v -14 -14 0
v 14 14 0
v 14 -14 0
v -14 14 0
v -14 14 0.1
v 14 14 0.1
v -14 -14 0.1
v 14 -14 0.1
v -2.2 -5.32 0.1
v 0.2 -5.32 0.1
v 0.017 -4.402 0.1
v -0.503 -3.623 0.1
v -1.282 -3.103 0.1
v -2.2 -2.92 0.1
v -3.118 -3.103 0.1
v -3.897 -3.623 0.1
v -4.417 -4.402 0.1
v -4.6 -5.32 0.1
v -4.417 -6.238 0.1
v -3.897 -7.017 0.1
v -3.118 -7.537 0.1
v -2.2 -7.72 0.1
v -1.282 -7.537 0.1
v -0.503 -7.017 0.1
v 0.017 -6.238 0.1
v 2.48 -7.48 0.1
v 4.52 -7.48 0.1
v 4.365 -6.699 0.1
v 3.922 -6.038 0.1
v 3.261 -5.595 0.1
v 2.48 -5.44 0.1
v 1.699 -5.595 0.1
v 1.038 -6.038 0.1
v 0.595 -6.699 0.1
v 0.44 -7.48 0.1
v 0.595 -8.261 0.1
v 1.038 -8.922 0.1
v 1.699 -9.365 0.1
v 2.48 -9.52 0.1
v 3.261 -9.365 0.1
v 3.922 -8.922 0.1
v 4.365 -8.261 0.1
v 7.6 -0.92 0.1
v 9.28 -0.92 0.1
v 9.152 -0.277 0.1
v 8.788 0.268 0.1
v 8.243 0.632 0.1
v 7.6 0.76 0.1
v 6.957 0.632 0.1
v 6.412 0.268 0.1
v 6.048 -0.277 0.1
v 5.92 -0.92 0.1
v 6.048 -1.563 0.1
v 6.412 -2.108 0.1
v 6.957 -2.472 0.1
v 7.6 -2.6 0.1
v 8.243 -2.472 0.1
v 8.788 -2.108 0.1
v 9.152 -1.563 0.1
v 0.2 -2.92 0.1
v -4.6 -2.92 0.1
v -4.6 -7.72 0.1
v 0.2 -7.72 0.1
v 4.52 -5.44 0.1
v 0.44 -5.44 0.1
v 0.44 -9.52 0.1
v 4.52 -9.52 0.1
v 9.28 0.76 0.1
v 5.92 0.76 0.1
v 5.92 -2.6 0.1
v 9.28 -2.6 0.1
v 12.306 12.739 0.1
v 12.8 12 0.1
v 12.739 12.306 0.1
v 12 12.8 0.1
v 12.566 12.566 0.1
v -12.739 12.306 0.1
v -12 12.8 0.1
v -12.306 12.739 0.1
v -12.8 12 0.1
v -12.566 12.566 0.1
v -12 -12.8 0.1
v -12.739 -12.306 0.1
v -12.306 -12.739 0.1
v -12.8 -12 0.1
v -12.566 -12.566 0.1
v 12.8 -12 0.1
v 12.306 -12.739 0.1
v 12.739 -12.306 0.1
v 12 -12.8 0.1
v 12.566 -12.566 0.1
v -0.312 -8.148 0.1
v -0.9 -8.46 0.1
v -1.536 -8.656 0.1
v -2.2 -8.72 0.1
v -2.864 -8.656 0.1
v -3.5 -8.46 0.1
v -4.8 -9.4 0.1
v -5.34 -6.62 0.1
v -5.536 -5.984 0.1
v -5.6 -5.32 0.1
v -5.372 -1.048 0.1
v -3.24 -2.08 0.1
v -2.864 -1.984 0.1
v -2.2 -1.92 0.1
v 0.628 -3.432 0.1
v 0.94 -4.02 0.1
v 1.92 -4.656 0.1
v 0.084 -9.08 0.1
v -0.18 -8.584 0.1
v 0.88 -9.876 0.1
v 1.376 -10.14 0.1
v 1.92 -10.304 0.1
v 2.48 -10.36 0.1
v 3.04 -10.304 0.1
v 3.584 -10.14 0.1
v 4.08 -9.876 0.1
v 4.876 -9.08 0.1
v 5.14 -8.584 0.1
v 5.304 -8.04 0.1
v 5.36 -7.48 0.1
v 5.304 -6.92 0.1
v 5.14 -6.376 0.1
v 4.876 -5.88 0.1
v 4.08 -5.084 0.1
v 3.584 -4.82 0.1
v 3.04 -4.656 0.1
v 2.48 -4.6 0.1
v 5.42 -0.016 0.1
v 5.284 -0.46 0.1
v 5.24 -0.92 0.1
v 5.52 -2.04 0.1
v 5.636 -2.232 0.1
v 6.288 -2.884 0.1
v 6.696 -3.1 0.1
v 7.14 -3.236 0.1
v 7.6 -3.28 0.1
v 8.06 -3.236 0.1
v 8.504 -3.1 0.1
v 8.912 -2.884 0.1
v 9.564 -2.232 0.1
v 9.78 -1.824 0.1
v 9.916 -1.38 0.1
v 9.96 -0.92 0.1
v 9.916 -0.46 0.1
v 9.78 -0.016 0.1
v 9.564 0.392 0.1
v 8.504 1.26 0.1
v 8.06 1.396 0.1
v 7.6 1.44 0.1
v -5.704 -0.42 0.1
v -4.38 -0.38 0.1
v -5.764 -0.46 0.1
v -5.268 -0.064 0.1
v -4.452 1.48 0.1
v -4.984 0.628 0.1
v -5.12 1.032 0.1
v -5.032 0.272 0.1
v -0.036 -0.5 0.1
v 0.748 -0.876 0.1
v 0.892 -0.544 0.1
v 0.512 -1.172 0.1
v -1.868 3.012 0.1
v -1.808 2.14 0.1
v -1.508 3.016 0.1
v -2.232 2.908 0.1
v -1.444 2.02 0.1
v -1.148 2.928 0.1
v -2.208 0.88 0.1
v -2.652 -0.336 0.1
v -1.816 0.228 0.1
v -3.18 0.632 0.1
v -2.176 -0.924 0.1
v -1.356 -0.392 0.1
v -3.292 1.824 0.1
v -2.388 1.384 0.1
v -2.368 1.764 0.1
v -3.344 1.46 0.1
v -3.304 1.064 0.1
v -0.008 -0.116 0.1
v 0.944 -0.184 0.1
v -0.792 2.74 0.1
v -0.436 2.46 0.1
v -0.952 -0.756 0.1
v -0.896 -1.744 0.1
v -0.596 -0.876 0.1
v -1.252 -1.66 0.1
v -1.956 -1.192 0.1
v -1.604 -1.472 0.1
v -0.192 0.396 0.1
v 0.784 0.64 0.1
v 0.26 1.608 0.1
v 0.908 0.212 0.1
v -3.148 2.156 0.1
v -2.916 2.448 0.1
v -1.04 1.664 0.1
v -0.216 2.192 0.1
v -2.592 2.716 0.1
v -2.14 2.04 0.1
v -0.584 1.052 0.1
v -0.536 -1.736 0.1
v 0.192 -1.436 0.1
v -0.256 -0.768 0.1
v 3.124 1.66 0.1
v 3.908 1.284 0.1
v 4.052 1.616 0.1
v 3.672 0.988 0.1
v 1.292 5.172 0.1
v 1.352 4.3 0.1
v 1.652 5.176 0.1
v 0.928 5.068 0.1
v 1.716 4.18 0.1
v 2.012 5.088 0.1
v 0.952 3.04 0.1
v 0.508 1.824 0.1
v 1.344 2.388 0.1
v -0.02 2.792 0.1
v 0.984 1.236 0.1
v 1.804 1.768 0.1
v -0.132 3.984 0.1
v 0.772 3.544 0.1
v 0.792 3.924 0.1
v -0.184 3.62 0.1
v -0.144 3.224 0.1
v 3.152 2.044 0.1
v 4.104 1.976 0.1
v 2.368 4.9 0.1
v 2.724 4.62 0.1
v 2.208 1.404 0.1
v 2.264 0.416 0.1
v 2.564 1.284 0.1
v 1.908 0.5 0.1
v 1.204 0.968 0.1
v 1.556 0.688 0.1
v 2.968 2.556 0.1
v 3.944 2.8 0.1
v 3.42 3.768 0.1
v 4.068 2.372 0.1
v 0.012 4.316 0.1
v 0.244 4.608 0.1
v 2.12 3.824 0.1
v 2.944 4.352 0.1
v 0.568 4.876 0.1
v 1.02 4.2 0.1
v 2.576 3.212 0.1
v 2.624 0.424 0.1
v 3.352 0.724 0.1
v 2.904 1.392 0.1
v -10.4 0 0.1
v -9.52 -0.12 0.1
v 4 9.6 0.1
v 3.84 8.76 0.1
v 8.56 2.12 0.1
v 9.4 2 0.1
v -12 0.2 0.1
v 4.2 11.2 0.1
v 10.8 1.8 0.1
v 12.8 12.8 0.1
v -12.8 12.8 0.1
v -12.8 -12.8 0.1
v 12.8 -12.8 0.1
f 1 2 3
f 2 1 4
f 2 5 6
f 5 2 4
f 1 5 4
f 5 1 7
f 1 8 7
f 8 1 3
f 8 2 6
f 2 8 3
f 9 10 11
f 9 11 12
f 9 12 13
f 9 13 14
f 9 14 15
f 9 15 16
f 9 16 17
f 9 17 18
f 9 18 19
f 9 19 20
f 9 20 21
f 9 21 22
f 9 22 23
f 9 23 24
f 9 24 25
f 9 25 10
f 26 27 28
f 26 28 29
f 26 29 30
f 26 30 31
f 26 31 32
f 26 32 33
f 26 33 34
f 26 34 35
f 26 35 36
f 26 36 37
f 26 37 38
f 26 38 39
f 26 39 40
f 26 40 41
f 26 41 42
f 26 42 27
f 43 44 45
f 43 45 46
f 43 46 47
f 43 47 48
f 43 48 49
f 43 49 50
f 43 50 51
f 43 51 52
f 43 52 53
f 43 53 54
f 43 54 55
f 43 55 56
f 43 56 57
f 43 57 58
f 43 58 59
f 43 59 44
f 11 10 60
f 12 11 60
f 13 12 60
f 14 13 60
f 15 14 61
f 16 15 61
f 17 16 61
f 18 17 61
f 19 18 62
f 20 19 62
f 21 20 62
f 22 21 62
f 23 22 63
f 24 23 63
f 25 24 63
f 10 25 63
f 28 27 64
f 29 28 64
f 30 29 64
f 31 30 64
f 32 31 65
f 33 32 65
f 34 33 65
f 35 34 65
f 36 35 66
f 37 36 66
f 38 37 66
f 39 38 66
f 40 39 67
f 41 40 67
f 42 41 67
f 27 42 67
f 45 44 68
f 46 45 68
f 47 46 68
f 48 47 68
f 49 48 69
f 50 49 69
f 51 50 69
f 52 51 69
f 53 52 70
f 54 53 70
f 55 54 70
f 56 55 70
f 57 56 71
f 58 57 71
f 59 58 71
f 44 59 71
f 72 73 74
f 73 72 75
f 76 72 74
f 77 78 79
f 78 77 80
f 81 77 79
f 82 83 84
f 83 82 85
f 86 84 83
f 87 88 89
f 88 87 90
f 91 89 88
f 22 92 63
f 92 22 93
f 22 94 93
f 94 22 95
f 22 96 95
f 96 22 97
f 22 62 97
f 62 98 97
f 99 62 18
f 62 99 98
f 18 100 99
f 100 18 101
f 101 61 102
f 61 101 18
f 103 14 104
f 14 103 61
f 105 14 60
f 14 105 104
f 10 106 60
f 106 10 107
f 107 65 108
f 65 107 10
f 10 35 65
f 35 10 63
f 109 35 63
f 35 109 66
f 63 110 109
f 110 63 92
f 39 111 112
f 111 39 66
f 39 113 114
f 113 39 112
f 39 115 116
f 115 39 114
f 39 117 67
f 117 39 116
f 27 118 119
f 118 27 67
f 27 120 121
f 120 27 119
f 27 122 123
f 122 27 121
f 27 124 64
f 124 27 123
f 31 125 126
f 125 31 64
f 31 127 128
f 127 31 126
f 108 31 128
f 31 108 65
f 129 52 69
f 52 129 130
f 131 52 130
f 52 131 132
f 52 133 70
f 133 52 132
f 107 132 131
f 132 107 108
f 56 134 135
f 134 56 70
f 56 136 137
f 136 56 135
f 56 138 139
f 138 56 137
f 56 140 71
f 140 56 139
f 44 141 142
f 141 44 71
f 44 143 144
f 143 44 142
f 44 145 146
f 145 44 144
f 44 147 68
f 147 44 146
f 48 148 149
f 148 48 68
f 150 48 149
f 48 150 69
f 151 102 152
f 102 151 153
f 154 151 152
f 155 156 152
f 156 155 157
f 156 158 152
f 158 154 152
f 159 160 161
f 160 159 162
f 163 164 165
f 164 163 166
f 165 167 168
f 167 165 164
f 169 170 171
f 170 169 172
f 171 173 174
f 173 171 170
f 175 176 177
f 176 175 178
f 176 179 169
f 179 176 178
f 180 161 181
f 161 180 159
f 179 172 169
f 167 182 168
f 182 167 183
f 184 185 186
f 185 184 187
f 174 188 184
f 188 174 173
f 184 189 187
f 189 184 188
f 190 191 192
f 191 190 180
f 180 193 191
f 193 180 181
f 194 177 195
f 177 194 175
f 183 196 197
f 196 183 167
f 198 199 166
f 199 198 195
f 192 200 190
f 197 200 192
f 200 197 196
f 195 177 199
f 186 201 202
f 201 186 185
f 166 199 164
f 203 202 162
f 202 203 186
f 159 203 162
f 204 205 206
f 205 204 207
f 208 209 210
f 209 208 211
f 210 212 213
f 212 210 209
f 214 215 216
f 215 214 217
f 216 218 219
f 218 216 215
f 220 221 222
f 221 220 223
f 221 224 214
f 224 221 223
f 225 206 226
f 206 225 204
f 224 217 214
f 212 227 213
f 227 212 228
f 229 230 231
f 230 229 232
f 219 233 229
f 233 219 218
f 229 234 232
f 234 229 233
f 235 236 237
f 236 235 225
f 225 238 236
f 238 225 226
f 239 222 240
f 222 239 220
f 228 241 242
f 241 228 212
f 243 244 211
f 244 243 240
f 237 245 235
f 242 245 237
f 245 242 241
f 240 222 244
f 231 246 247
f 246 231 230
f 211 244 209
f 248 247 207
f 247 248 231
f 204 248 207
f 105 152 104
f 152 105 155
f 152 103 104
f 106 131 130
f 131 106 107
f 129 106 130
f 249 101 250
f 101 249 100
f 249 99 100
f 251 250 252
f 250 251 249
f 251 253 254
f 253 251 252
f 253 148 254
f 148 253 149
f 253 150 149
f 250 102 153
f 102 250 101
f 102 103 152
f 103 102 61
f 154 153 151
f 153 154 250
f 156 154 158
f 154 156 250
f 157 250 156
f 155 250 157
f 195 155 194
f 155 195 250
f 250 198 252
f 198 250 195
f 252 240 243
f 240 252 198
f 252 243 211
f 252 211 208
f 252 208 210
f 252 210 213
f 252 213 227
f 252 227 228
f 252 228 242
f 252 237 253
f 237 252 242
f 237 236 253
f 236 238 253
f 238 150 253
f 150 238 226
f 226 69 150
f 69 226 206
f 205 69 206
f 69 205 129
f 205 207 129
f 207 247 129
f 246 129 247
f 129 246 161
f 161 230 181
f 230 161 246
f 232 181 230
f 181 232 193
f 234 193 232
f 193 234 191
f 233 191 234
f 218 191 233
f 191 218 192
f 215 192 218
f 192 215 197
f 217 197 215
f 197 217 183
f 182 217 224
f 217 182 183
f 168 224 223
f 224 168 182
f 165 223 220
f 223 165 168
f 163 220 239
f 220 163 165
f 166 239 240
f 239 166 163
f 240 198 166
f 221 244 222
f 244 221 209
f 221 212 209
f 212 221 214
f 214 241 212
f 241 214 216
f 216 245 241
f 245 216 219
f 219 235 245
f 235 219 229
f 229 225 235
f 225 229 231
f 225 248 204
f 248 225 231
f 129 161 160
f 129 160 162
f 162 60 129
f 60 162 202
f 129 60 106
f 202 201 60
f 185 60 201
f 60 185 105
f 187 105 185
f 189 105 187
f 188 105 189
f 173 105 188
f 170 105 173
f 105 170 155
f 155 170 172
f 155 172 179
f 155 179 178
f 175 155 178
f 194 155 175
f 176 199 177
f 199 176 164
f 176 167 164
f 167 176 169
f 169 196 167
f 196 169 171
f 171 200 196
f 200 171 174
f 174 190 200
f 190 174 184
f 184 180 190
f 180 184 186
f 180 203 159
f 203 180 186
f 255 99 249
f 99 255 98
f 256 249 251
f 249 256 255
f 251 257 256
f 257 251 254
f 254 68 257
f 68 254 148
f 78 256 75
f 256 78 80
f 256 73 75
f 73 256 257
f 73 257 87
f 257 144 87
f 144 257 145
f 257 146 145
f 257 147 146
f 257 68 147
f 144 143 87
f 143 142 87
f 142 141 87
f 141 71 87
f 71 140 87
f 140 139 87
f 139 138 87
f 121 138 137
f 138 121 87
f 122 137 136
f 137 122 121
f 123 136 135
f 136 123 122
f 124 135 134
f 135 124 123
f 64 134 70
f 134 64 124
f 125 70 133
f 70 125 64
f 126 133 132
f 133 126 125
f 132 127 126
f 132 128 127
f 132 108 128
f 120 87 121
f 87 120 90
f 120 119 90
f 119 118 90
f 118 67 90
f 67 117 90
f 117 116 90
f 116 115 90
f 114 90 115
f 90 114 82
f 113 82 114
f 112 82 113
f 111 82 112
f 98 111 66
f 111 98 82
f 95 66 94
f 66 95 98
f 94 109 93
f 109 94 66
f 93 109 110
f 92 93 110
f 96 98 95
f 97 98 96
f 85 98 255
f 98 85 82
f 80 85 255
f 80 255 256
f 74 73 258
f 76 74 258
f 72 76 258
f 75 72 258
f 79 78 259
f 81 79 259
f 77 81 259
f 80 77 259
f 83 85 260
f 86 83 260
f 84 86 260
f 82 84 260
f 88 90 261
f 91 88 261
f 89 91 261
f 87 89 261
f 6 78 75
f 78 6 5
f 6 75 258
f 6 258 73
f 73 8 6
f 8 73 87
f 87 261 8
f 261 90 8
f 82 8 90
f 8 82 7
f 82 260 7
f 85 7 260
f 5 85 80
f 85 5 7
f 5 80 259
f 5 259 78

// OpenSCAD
// file: ../p/4-4ndis.scad
use <../lib.scad>
function ldraw_lib__4_4ndis() = [
// 0 Disc Negative 1.0
// 0 Name: 4-4ndis.dat
// 0 Author: James Jessiman
// 0 !LDRAW_ORG Primitive UPDATE 2012-01
// 0 !LICENSE Licensed under CC BY 4.0 : see CAreadme.txt
// 
// 0 BFC CERTIFY CCW
  [0,"BFC","CERTIFY"],
  [0,"BFC","CCW"],
// 
// 0 !HISTORY 2002-03-23 [sbliss] Added BFC statement; compacted code
// 0 !HISTORY 2002-04-25 [PTadmin] Official Update 2002-02
// 0 !HISTORY 2007-06-24 [PTadmin] Header formatted for Contributor Agreement
// 0 !HISTORY 2008-07-01 [PTadmin] Official Update 2008-01
// 0 !HISTORY 2012-02-16 [Philo] Changed to CCW
// 0 !HISTORY 2012-03-30 [PTadmin] Official Update 2012-01
// 
// 
// 3 16 0.9239 0 0.3827 1 0 0 1 0 1
  [3,16,0.9239,0,0.3827,1,0,0,1,0,1],
// 3 16 0.7071 0 0.7071 0.9239 0 0.3827 1 0 1
  [3,16,0.7071,0,0.7071,0.9239,0,0.3827,1,0,1],
// 3 16 0.3827 0 0.9239 0.7071 0 0.7071 1 0 1
  [3,16,0.3827,0,0.9239,0.7071,0,0.7071,1,0,1],
// 3 16 0 0 1 0.3827 0 0.9239 1 0 1
  [3,16,0,0,1,0.3827,0,0.9239,1,0,1],
// 3 16 -0.3827 0 0.9239 0 0 1 -1 0 1
  [3,16,-0.3827,0,0.9239,0,0,1,-1,0,1],
// 3 16 -0.7071 0 0.7071 -0.3827 0 0.9239 -1 0 1
  [3,16,-0.7071,0,0.7071,-0.3827,0,0.9239,-1,0,1],
// 3 16 -0.9239 0 0.3827 -0.7071 0 0.7071 -1 0 1
  [3,16,-0.9239,0,0.3827,-0.7071,0,0.7071,-1,0,1],
// 3 16 -1 0 0 -0.9239 0 0.3827 -1 0 1
  [3,16,-1,0,0,-0.9239,0,0.3827,-1,0,1],
// 3 16 -0.9239 0 -0.3827 -1 0 0 -1 0 -1
  [3,16,-0.9239,0,-0.3827,-1,0,0,-1,0,-1],
// 3 16 -0.7071 0 -0.7071 -0.9239 0 -0.3827 -1 0 -1
  [3,16,-0.7071,0,-0.7071,-0.9239,0,-0.3827,-1,0,-1],
// 3 16 -0.3827 0 -0.9239 -0.7071 0 -0.7071 -1 0 -1
  [3,16,-0.3827,0,-0.9239,-0.7071,0,-0.7071,-1,0,-1],
// 3 16 0 0 -1 -0.3827 0 -0.9239 -1 0 -1
  [3,16,0,0,-1,-0.3827,0,-0.9239,-1,0,-1],
// 3 16 0.3827 0 -0.9239 0 0 -1 1 0 -1
  [3,16,0.3827,0,-0.9239,0,0,-1,1,0,-1],
// 3 16 0.7071 0 -0.7071 0.3827 0 -0.9239 1 0 -1
  [3,16,0.7071,0,-0.7071,0.3827,0,-0.9239,1,0,-1],
// 3 16 0.9239 0 -0.3827 0.7071 0 -0.7071 1 0 -1
  [3,16,0.9239,0,-0.3827,0.7071,0,-0.7071,1,0,-1],
// 3 16 1 0 0 0.9239 0 -0.3827 1 0 -1
  [3,16,1,0,0,0.9239,0,-0.3827,1,0,-1],
];
module ldraw_lib__4_4ndis(step=0, col=false, unit=2/5, alt=false, line=0.2, solid=!$preview)
    makepoly(ldraw_lib__4_4ndis(), step=step, col=col, unit=unit, alt=alt, line=line, solid=solid);
ldraw_lib__4_4ndis(line=0.2);
// file: ../p/4-4disc.scad
use <../lib.scad>
function ldraw_lib__4_4disc() = [
// 0 Disc 1.0
// 0 Name: 4-4disc.dat
// 0 Author: James Jessiman
// 0 !LDRAW_ORG Primitive UPDATE 2002-02
// 0 !LICENSE Licensed under CC BY 4.0 : see CAreadme.txt
// 
// 0 BFC CERTIFY CCW
  [0,"BFC","CERTIFY"],
  [0,"BFC","CCW"],
// 
// 0 !HISTORY 1998-12-15 [PTadmin] Official Update 1998-10
// 0 !HISTORY 2002-03-23 [sbliss] Added BFC statement
// 0 !HISTORY 2002-04-25 [PTadmin] Official Update 2002-02
// 0 !HISTORY 2007-06-24 [PTadmin] Header formatted for Contributor Agreement
// 0 !HISTORY 2008-07-01 [PTadmin] Official Update 2008-01
// 
// 
// 3 16 0 0 0 1 0 0 0.9239 0 0.3827
  [3,16,0,0,0,1,0,0,0.9239,0,0.3827],
// 3 16 0 0 0 0.9239 0 0.3827 0.7071 0 0.7071
  [3,16,0,0,0,0.9239,0,0.3827,0.7071,0,0.7071],
// 3 16 0 0 0 0.7071 0 0.7071 0.3827 0 0.9239
  [3,16,0,0,0,0.7071,0,0.7071,0.3827,0,0.9239],
// 3 16 0 0 0 0.3827 0 0.9239 0 0 1
  [3,16,0,0,0,0.3827,0,0.9239,0,0,1],
// 3 16 0 0 0 0 0 1 -0.3827 0 0.9239
  [3,16,0,0,0,0,0,1,-0.3827,0,0.9239],
// 3 16 0 0 0 -0.3827 0 0.9239 -0.7071 0 0.7071
  [3,16,0,0,0,-0.3827,0,0.9239,-0.7071,0,0.7071],
// 3 16 0 0 0 -0.7071 0 0.7071 -0.9239 0 0.3827
  [3,16,0,0,0,-0.7071,0,0.7071,-0.9239,0,0.3827],
// 3 16 0 0 0 -0.9239 0 0.3827 -1 0 -0
  [3,16,0,0,0,-0.9239,0,0.3827,-1,0,-0],
// 3 16 0 0 0 -1 0 -0 -0.9239 0 -0.3827
  [3,16,0,0,0,-1,0,-0,-0.9239,0,-0.3827],
// 3 16 0 0 0 -0.9239 0 -0.3827 -0.7071 0 -0.7071
  [3,16,0,0,0,-0.9239,0,-0.3827,-0.7071,0,-0.7071],
// 3 16 0 0 0 -0.7071 0 -0.7071 -0.3827 0 -0.9239
  [3,16,0,0,0,-0.7071,0,-0.7071,-0.3827,0,-0.9239],
// 3 16 0 0 0 -0.3827 0 -0.9239 0 0 -1
  [3,16,0,0,0,-0.3827,0,-0.9239,0,0,-1],
// 3 16 0 0 0 0 0 -1 0.3827 0 -0.9239
  [3,16,0,0,0,0,0,-1,0.3827,0,-0.9239],
// 3 16 0 0 0 0.3827 0 -0.9239 0.7071 0 -0.7071
  [3,16,0,0,0,0.3827,0,-0.9239,0.7071,0,-0.7071],
// 3 16 0 0 0 0.7071 0 -0.7071 0.9239 0 -0.3827
  [3,16,0,0,0,0.7071,0,-0.7071,0.9239,0,-0.3827],
// 3 16 0 0 0 0.9239 0 -0.3827 1 0 0
  [3,16,0,0,0,0.9239,0,-0.3827,1,0,0],
// 0
];
module ldraw_lib__4_4disc(step=0, col=false, unit=2/5, alt=false, line=0.2, solid=!$preview)
    makepoly(ldraw_lib__4_4disc(), step=step, col=col, unit=unit, alt=alt, line=line, solid=solid);
ldraw_lib__4_4disc(line=0.2);
// file: ../p/1-4chrd.scad
use <../lib.scad>
function ldraw_lib__1_4chrd() = [
// 0 Chord 0.25
// 0 Name: 1-4chrd.dat
// 0 Author: Max Martin Richter [MMR1988]
// 0 !LDRAW_ORG Primitive UPDATE 2023-05
// 0 !LICENSE Licensed under CC BY 4.0 : see CAreadme.txt
// 
// 0 BFC CERTIFY CCW
  [0,"BFC","CERTIFY"],
  [0,"BFC","CCW"],
// 
// 0 !HISTORY 2004-04-22 [PTadmin] Official Update 2004-02
// 0 !HISTORY 2007-10-09 [PTadmin] Header formatted for Contributor Agreement
// 0 !HISTORY 2008-07-01 [PTadmin] Official Update 2008-01
// 0 !HISTORY 2012-08-02 [MMR1988] Re-creation with PrimGen2 and Rectifier
// 0 !HISTORY 2012-08-09 [PTadmin] Official Update 2012-02
// 0 !HISTORY 2023-10-27 [OrionP] Change author to MMR1988 from hafhead
// 0 !HISTORY 2023-10-31 [OrionP] Official Update 2023-05
// 
// 4 16 0.9239 0 0.3827 0.3827 0 0.9239 0 0 1 1 0 0
  [4,16,0.9239,0,0.3827,0.3827,0,0.9239,0,0,1,1,0,0],
// 3 16 0.7071 0 0.7071 0.3827 0 0.9239 0.9239 0 0.3827
  [3,16,0.7071,0,0.7071,0.3827,0,0.9239,0.9239,0,0.3827],
];
module ldraw_lib__1_4chrd(step=0, col=false, unit=2/5, alt=false, line=0.2, solid=!$preview)
    makepoly(ldraw_lib__1_4chrd(), step=step, col=col, unit=unit, alt=alt, line=line, solid=solid);
ldraw_lib__1_4chrd(line=0.2);
// file: ../p/box5-12.scad
use <../lib.scad>
function ldraw_lib__box5_12() = [
// 0 Box with 5 Faces without Any Edges
// 0 Name: box5-12.dat
// 0 Author: Chris Dee [cwdee]
// 0 !LDRAW_ORG Primitive UPDATE 2009-02
// 0 !LICENSE Licensed under CC BY 4.0 : see CAreadme.txt
// 
// 0 BFC CERTIFY CCW
  [0,"BFC","CERTIFY"],
  [0,"BFC","CCW"],
// 
// 0 !HISTORY 2009-09-03 [PTadmin] Official Update 2009-02
// 
// 
// 4 16 1 1 1 1 1 -1 -1 1 -1 -1 1 1
  [4,16,1,1,1,1,1,-1,-1,1,-1,-1,1,1],
// 4 16 -1 0 1 1 0 1 1 1 1 -1 1 1
  [4,16,-1,0,1,1,0,1,1,1,1,-1,1,1],
// 4 16 -1 0 -1 -1 0 1 -1 1 1 -1 1 -1
  [4,16,-1,0,-1,-1,0,1,-1,1,1,-1,1,-1],
// 4 16 1 0 -1 -1 0 -1 -1 1 -1 1 1 -1
  [4,16,1,0,-1,-1,0,-1,-1,1,-1,1,1,-1],
// 4 16 1 0 1 1 0 -1 1 1 -1 1 1 1
  [4,16,1,0,1,1,0,-1,1,1,-1,1,1,1],
// 0
];
module ldraw_lib__box5_12(step=0, col=false, unit=2/5, alt=false, line=0.2, solid=!$preview)
    makepoly(ldraw_lib__box5_12(), step=step, col=col, unit=unit, alt=alt, line=line, solid=solid);
ldraw_lib__box5_12(line=0.2);
// file: ../p/1-4ndis.scad
use <../lib.scad>
function ldraw_lib__1_4ndis() = [
// 0 Disc Negative 0.25
// 0 Name: 1-4ndis.dat
// 0 Author: James Jessiman
// 0 !LDRAW_ORG Primitive UPDATE 2012-01
// 0 !LICENSE Licensed under CC BY 4.0 : see CAreadme.txt
// 
// 0 BFC CERTIFY CCW
  [0,"BFC","CERTIFY"],
  [0,"BFC","CCW"],
// 
// 0 !HISTORY 2002-03-23 [sbliss] Added BFC Statement
// 0 !HISTORY 2002-04-25 [PTadmin] Official Update 2002-02
// 0 !HISTORY 2007-06-22 [PTadmin] Header formatted for Contributor Agreement
// 0 !HISTORY 2008-07-01 [PTadmin] Official Update 2008-01
// 0 !HISTORY 2012-02-16 [Philo] Changed to CCW
// 0 !HISTORY 2012-03-30 [PTadmin] Official Update 2012-01
// 
// 
// 3 16 0.9239 0 0.3827 1 0 0 1 0 1
  [3,16,0.9239,0,0.3827,1,0,0,1,0,1],
// 3 16 0.7071 0 0.7071 0.9239 0 0.3827 1 0 1
  [3,16,0.7071,0,0.7071,0.9239,0,0.3827,1,0,1],
// 3 16 0.3827 0 0.9239 0.7071 0 0.7071 1 0 1
  [3,16,0.3827,0,0.9239,0.7071,0,0.7071,1,0,1],
// 3 16 0 0 1 0.3827 0 0.9239 1 0 1
  [3,16,0,0,1,0.3827,0,0.9239,1,0,1],
];
module ldraw_lib__1_4ndis(step=0, col=false, unit=2/5, alt=false, line=0.2, solid=!$preview)
    makepoly(ldraw_lib__1_4ndis(), step=step, col=col, unit=unit, alt=alt, line=line, solid=solid);
ldraw_lib__1_4ndis(line=0.2);
// main file
use <../lib.scad>
use <../p/1-4ndis.scad>
use <../p/box5-12.scad>
use <s/160205ds01.scad>
function ldraw_lib__160205d() = [
// 0 Sticker  3.5 x  3.5 with Bank Note and Coins
// 0 Name: 160205d.dat
// 0 Author: Takeshi Takahashi [RainbowDolphin]
// 0 !LDRAW_ORG Part UPDATE 2025-07
// 0 !LICENSE Licensed under CC BY 4.0 : see CAreadme.txt
// 
// 0 BFC CERTIFY CCW
  [0,"BFC","CERTIFY"],
  [0,"BFC","CCW"],
// 
// 0 !KEYWORDS Bricklink 1490stk01, Brickowl 763104, Rebrickable 160205, Set 1490
// 0 !KEYWORDS Signboard, Town bank
// 
// 0 !HISTORY 2023-04-17 [OrionP] Official Update 2023-02
// 0 !HISTORY 2025-07-27 [OrionP] Minor header edits
// 0 !HISTORY 2025-07-27 [OrionP] Official Update 2025-07
// 
// 
// 1 16 0 -0.25 0 35 0 0 0 0.25 0 0 0 35 box5-12.dat
  [1,16,0,-0.25,0,35,0,0,0,0.25,0,0,0,35, ldraw_lib__box5_12()],
// 1 16 0 -.25 0 1 0 0 0 1 0 0 0 1 s\160205ds01.dat
  [1,16,0,-.25,0,1,0,0,0,1,0,0,0,1, ldraw_lib__s__160205ds01()],
// 1 0 30 -0.25 30 2 0 0 0 1 0 0 0 2 1-4ndis.dat
  [1,0,30,-0.25,30,2,0,0,0,1,0,0,0,2, ldraw_lib__1_4ndis()],
// 1 0 -30 -0.25 30 0 0 -2 0 1 0 2 0 0 1-4ndis.dat
  [1,0,-30,-0.25,30,0,0,-2,0,1,0,2,0,0, ldraw_lib__1_4ndis()],
// 1 0 -30 -0.25 -30 -2 0 0 0 1 0 0 0 -2 1-4ndis.dat
  [1,0,-30,-0.25,-30,-2,0,0,0,1,0,0,0,-2, ldraw_lib__1_4ndis()],
// 1 0 30 -0.25 -30 0 0 2 0 1 0 -2 0 0 1-4ndis.dat
  [1,0,30,-0.25,-30,0,0,2,0,1,0,-2,0,0, ldraw_lib__1_4ndis()],
// 4 0 35 -0.25 35 -35 -0.25 35 -30 -0.25 32 30 -0.25 32
  [4,0,35,-0.25,35,-35,-0.25,35,-30,-0.25,32,30,-0.25,32],
// 3 0 35 -0.25 35 30 -0.25 32 32 -0.25 32
  [3,0,35,-0.25,35,30,-0.25,32,32,-0.25,32],
// 3 0 35 -0.25 35 32 -0.25 32 32 -0.25 30
  [3,0,35,-0.25,35,32,-0.25,32,32,-0.25,30],
// 4 0 35 -0.25 35 32 -0.25 30 32 -0.25 -30 35 -0.25 -35
  [4,0,35,-0.25,35,32,-0.25,30,32,-0.25,-30,35,-0.25,-35],
// 3 0 32 -0.25 -30 32 -0.25 -32 35 -0.25 -35
  [3,0,32,-0.25,-30,32,-0.25,-32,35,-0.25,-35],
// 3 0 32 -0.25 -32 30 -0.25 -32 35 -0.25 -35
  [3,0,32,-0.25,-32,30,-0.25,-32,35,-0.25,-35],
// 4 0 35 -0.25 -35 30 -0.25 -32 -30 -0.25 -32 -35 -0.25 -35
  [4,0,35,-0.25,-35,30,-0.25,-32,-30,-0.25,-32,-35,-0.25,-35],
// 3 0 -30 -0.25 -32 -32 -0.25 -32 -35 -0.25 -35
  [3,0,-30,-0.25,-32,-32,-0.25,-32,-35,-0.25,-35],
// 3 0 -32 -0.25 -30 -35 -0.25 -35 -32 -0.25 -32
  [3,0,-32,-0.25,-30,-35,-0.25,-35,-32,-0.25,-32],
// 4 0 -35 -0.25 -35 -32 -0.25 -30 -32 -0.25 30 -35 -0.25 35
  [4,0,-35,-0.25,-35,-32,-0.25,-30,-32,-0.25,30,-35,-0.25,35],
// 3 0 -35 -0.25 35 -32 -0.25 30 -32 -0.25 32
  [3,0,-35,-0.25,35,-32,-0.25,30,-32,-0.25,32],
// 3 0 -35 -0.25 35 -32 -0.25 32 -30 -0.25 32
  [3,0,-35,-0.25,35,-32,-0.25,32,-30,-0.25,32],
];
module ldraw_lib__160205d(step=0, col=false, unit=2/5, alt=false, line=0.2, solid=!$preview)
    makepoly(ldraw_lib__160205d(), step=step, col=col, unit=unit, alt=alt, line=line, solid=solid);
ldraw_lib__160205d(line=0.2);
